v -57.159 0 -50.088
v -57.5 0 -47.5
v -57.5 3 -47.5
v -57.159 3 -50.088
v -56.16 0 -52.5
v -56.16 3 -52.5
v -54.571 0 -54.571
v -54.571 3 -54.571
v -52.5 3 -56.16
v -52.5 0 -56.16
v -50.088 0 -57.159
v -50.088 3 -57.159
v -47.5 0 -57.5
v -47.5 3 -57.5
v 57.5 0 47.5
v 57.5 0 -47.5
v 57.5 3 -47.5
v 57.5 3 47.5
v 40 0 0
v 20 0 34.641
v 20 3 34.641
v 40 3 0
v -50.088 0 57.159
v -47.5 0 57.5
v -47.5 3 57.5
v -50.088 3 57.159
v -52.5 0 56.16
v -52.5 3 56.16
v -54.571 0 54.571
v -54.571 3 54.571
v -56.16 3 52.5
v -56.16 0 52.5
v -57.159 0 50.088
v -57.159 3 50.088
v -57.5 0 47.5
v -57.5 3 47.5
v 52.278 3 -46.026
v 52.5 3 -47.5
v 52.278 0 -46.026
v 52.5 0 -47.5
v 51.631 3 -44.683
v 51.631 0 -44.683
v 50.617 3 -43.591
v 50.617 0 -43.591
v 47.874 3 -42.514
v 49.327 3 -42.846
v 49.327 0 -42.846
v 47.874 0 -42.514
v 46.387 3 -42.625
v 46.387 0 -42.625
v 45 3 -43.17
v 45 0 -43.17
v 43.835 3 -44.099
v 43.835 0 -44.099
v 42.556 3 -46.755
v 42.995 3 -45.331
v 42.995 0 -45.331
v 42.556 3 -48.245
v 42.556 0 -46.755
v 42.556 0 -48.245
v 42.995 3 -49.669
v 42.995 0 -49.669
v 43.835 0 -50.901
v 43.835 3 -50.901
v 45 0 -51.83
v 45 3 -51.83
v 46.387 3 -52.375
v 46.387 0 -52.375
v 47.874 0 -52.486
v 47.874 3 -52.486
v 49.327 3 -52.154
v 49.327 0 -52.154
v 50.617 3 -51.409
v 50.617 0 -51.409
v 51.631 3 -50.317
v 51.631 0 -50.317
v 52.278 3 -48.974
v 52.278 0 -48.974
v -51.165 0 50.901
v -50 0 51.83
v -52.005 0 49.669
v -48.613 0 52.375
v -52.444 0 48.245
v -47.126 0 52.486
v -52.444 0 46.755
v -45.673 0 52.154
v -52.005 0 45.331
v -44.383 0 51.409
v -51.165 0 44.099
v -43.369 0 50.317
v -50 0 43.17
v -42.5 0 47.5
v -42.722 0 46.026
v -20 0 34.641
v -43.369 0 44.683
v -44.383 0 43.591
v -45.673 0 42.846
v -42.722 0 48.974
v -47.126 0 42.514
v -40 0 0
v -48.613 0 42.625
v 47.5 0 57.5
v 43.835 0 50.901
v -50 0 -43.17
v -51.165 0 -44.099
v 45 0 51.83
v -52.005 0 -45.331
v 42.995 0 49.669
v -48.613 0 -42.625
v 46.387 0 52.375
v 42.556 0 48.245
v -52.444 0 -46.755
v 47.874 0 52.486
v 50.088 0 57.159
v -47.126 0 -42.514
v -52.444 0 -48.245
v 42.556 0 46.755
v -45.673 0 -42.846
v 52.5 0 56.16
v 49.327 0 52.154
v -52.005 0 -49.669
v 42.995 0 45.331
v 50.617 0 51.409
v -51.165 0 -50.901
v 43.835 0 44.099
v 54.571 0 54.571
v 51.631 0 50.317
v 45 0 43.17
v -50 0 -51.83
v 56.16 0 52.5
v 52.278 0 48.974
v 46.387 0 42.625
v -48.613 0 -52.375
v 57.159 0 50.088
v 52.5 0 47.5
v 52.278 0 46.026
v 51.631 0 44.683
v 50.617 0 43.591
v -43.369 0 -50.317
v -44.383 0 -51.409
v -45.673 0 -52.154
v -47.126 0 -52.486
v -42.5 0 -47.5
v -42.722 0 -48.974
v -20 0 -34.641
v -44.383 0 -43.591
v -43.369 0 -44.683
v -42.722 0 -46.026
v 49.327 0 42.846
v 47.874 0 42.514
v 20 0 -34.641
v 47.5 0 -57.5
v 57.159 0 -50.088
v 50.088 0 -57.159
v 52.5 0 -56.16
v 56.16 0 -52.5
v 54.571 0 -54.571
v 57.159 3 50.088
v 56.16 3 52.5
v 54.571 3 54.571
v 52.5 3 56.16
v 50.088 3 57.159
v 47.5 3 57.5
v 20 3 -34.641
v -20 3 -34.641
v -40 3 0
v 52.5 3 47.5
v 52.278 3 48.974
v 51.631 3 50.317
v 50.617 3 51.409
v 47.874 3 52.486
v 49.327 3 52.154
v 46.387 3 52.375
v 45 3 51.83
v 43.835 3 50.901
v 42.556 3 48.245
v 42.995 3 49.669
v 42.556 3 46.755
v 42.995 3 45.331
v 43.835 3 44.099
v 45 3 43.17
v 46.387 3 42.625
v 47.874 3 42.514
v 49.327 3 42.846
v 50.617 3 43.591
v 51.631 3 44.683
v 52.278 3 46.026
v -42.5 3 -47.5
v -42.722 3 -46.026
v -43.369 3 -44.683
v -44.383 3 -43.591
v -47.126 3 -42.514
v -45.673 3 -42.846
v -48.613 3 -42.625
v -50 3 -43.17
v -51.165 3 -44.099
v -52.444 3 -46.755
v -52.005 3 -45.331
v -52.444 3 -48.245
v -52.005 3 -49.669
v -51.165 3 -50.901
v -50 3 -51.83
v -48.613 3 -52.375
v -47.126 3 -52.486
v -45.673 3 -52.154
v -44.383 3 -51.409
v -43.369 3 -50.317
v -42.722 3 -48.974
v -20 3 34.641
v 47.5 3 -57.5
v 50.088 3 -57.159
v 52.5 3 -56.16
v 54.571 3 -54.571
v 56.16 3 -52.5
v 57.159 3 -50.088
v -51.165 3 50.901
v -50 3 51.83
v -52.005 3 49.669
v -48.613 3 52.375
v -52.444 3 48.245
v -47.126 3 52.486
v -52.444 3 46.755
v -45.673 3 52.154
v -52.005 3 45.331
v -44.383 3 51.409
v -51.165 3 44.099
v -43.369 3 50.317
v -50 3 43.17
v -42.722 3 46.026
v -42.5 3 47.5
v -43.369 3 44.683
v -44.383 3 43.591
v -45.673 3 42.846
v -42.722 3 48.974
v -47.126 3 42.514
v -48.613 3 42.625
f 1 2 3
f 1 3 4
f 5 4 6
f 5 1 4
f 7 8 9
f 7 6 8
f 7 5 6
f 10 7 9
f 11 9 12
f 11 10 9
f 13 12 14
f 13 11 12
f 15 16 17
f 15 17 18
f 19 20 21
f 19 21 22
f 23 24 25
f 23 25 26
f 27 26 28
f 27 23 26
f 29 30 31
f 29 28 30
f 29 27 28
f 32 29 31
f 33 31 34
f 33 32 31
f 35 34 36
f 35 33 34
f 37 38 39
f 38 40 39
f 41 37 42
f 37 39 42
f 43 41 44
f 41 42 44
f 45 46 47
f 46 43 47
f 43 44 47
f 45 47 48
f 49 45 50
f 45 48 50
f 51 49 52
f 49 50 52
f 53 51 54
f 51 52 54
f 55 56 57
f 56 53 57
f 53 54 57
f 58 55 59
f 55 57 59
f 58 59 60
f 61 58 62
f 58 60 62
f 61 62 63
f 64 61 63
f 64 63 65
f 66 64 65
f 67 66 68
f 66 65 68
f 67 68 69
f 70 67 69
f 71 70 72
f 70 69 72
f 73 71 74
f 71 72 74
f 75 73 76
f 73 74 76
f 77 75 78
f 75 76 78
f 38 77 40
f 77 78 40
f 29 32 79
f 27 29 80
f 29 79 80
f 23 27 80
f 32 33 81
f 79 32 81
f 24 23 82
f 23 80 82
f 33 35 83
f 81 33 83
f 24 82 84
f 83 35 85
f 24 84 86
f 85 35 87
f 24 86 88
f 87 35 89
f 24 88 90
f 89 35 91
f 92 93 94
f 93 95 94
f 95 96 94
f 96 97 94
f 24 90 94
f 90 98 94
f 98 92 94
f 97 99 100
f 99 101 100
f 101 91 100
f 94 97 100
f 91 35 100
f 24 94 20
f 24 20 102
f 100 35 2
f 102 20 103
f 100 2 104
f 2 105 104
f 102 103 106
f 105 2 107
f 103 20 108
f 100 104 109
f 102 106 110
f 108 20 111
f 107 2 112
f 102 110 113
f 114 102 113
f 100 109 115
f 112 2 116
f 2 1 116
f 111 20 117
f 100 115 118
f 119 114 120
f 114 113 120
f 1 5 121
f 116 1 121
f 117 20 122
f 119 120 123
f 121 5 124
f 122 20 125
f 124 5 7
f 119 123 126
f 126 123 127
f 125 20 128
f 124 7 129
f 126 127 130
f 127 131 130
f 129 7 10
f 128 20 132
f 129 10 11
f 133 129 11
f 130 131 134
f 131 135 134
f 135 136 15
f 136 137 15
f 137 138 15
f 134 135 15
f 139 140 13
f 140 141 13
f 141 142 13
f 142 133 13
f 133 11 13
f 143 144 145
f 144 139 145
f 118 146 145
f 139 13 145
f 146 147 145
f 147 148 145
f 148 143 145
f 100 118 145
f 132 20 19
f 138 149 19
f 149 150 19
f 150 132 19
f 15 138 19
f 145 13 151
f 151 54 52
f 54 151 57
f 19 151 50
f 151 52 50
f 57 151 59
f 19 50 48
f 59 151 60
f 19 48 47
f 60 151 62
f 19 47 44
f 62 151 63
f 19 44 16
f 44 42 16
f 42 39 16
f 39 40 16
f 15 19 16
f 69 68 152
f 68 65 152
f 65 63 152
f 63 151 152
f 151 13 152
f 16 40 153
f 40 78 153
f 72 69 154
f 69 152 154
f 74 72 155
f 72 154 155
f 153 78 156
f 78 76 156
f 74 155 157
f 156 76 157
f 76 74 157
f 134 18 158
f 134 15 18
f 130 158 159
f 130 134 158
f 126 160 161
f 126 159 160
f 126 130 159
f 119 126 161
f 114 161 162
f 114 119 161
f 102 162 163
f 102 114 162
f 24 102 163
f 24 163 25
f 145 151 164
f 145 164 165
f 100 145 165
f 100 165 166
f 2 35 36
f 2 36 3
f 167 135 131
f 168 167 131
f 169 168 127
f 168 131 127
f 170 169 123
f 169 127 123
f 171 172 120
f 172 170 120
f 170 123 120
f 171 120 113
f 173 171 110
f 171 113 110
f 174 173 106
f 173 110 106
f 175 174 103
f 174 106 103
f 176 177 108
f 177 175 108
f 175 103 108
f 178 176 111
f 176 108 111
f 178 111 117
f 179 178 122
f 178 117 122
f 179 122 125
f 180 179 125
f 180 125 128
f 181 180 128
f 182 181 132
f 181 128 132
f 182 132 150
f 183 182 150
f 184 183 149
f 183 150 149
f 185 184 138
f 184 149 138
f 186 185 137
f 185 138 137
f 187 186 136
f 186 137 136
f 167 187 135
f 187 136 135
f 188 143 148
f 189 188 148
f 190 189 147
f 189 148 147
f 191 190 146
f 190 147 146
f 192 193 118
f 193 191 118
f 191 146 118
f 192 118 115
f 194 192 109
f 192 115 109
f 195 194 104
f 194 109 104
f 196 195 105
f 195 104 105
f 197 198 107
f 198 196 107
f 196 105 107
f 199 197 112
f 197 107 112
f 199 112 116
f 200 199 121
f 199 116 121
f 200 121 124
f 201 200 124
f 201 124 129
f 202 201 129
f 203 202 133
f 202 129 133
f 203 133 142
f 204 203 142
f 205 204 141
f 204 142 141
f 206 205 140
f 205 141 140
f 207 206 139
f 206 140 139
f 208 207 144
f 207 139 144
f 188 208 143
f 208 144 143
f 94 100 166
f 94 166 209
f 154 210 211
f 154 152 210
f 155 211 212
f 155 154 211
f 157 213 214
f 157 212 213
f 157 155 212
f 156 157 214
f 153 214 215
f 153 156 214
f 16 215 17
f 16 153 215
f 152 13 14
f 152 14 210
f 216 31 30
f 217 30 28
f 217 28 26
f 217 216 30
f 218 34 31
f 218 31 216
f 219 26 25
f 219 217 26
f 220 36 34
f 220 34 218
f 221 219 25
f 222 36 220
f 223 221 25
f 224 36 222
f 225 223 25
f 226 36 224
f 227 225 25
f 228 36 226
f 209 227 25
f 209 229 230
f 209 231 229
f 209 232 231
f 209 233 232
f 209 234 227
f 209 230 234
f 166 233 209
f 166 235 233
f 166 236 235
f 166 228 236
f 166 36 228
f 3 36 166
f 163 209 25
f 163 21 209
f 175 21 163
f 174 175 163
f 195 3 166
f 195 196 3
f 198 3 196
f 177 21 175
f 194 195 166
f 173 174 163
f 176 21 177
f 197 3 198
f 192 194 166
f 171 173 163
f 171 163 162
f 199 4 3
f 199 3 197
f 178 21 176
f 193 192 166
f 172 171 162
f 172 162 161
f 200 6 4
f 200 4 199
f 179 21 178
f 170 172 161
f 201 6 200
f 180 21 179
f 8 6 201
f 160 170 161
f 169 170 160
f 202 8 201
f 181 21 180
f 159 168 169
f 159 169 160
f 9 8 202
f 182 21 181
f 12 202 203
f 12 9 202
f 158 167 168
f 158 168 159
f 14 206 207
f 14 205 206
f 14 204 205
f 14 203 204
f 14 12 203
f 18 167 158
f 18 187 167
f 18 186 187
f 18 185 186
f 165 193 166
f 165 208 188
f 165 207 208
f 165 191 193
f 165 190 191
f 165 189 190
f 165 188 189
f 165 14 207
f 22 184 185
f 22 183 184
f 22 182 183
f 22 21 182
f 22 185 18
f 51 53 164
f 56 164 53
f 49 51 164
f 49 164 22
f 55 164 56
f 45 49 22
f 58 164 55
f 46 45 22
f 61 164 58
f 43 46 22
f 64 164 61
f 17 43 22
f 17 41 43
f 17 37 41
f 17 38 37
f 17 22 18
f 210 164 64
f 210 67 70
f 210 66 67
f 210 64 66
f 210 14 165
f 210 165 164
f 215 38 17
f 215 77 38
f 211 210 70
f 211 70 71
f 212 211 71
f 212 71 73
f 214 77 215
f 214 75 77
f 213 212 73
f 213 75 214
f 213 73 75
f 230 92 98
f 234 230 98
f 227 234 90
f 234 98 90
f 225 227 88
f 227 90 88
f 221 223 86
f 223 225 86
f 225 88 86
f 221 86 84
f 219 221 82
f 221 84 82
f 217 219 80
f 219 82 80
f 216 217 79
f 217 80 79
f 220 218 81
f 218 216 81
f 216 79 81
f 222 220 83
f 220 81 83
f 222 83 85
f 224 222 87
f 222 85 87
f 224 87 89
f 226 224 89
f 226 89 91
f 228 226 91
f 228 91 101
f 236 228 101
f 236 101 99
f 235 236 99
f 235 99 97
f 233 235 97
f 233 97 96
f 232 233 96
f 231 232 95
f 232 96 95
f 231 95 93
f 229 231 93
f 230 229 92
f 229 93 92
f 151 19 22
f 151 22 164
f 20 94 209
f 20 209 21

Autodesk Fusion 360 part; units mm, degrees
sketch "Sketch1" plane through (0, 0, 0) normal (0, 1, 0) x (1, 0, 0)
  line L0 (47.5, -57.5) -> (-47.5, -57.5)
  line L1 (-57.5, -47.5) -> (-57.5, 47.5)
  line L2 (-47.5, 57.5) -> (47.5, 57.5)
  line L3 (57.5, 47.5) -> (57.5, -47.5)
  line L4 (57.5, -57.5) -> (-57.5, 57.5) construction
  line L5 (-57.5, -57.5) -> (57.5, 57.5) construction
  arc A0 (57.5, 47.5) -> (47.5, 57.5) centre (47.5, 47.5) ccw
  arc A1 (47.5, -57.5) -> (57.5, -47.5) centre (47.5, -47.5) ccw
  arc A2 (-57.5, -47.5) -> (-47.5, -57.5) centre (-47.5, -47.5) ccw
  arc A3 (-47.5, 57.5) -> (-57.5, 47.5) centre (-47.5, 47.5) ccw
  circle A4 centre (-47.5, 47.5) radius 5
  circle A5 centre (47.5, 47.5) radius 5
  circle A6 centre (47.5, -47.5) radius 5
  circle A7 centre (-47.5, -47.5) radius 5
  line L6 (40, 0) -> (20, 34.641)
  line L7 (20, 34.641) -> (-20, 34.641)
  line L8 (-20, 34.641) -> (-40, 0)
  line L9 (-40, 0) -> (-20, -34.641)
  line L10 (-20, -34.641) -> (20, -34.641)
  line L11 (20, -34.641) -> (40, 0)
  dimension "d1" = 115
  dimension "d2" = 115
  dimension "d3" = 10
  dimension "d4" = 10
  dimension "d5" = 10
  dimension "d6" = 10
  dimension "d7" = 10
  dimension "d8" = 10
  dimension "d9" = 40
extrude "Extrude1" add sketch "Sketch1" along normal blind 3
